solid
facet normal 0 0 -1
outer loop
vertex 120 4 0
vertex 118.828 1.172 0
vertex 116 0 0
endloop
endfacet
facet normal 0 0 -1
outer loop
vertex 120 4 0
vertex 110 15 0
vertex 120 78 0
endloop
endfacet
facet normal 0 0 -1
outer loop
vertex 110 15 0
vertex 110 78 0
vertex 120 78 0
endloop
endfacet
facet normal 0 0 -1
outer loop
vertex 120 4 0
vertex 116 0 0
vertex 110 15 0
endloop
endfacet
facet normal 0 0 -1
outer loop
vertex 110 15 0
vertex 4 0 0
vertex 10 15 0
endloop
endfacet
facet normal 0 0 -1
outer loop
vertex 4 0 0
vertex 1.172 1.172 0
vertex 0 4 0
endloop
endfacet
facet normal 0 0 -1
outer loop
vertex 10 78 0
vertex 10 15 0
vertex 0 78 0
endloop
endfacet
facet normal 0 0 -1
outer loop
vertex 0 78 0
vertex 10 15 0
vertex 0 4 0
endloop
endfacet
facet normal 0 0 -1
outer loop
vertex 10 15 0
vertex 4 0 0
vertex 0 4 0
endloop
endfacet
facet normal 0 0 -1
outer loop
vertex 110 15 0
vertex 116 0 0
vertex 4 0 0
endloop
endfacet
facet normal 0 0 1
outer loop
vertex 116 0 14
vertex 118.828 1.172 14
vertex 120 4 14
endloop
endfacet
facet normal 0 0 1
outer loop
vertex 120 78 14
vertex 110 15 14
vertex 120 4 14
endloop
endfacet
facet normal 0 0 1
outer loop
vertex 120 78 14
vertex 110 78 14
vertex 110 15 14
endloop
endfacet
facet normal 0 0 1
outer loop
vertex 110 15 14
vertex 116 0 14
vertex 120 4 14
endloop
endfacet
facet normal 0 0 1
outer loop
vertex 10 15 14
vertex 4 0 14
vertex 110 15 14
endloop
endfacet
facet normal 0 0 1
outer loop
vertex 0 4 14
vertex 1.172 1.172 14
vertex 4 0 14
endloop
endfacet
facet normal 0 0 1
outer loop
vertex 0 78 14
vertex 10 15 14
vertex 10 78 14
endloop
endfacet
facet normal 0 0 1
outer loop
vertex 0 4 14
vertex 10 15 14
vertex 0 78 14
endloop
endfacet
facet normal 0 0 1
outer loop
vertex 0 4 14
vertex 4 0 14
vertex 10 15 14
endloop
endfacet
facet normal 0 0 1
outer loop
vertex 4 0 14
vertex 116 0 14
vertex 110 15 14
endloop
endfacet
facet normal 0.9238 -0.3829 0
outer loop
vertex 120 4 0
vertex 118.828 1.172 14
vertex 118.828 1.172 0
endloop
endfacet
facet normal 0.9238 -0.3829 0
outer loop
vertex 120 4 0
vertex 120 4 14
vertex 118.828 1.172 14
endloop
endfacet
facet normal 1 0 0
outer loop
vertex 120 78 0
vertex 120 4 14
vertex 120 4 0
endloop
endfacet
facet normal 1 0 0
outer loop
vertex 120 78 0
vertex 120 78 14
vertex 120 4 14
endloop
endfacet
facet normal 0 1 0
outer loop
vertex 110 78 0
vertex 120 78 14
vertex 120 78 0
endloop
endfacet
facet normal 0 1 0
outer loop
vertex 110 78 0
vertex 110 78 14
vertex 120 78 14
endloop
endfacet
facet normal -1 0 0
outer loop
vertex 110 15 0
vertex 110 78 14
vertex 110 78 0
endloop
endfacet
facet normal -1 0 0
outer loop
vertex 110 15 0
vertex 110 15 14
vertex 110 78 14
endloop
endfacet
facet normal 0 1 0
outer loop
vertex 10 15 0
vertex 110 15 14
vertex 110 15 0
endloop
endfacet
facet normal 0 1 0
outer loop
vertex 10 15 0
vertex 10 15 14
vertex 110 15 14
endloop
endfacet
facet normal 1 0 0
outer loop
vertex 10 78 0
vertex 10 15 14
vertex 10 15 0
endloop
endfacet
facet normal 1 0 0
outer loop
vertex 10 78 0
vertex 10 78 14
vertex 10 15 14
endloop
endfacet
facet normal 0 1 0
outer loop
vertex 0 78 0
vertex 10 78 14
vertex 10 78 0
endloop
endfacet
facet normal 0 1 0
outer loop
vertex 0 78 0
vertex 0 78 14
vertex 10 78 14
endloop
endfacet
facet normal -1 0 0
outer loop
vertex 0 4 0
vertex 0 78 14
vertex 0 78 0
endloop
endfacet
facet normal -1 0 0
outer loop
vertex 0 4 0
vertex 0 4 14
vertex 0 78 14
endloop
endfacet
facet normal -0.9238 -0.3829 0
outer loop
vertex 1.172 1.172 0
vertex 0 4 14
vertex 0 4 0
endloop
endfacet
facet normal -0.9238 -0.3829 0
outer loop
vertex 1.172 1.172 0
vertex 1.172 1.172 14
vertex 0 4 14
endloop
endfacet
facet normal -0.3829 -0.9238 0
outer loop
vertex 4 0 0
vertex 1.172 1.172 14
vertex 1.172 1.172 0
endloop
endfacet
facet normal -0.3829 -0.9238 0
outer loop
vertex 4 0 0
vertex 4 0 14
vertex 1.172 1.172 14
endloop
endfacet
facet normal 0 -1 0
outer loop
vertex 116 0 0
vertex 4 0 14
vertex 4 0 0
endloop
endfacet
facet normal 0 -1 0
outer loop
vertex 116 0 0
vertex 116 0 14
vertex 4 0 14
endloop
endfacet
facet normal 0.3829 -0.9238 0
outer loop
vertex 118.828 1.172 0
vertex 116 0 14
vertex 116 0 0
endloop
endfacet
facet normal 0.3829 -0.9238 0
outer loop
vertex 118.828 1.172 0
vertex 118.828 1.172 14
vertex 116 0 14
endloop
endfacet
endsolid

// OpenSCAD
$fn = 32;

// ----------------------------------------------------------------------
// Heat sink frame: 120 x 78 mm frame, 10 mm walls
// ----------------------------------------------------------------------

// --- parameters (mm) ---
profile_height = 14;      // extrusion height
profile_points = 12;      // points of the closed outline

profile = [[0, 4], [1.172, 1.172], [4, 0], [116, 0], [118.828, 1.172], [120, 4], [120, 78], [110, 78], [110, 15], [10, 15], [10, 78], [0, 78]];  // single closed polygon, 12 points, counter clockwise

// --- the one profile operation ---
linear_extrude(height = profile_height) polygon(points = profile);
